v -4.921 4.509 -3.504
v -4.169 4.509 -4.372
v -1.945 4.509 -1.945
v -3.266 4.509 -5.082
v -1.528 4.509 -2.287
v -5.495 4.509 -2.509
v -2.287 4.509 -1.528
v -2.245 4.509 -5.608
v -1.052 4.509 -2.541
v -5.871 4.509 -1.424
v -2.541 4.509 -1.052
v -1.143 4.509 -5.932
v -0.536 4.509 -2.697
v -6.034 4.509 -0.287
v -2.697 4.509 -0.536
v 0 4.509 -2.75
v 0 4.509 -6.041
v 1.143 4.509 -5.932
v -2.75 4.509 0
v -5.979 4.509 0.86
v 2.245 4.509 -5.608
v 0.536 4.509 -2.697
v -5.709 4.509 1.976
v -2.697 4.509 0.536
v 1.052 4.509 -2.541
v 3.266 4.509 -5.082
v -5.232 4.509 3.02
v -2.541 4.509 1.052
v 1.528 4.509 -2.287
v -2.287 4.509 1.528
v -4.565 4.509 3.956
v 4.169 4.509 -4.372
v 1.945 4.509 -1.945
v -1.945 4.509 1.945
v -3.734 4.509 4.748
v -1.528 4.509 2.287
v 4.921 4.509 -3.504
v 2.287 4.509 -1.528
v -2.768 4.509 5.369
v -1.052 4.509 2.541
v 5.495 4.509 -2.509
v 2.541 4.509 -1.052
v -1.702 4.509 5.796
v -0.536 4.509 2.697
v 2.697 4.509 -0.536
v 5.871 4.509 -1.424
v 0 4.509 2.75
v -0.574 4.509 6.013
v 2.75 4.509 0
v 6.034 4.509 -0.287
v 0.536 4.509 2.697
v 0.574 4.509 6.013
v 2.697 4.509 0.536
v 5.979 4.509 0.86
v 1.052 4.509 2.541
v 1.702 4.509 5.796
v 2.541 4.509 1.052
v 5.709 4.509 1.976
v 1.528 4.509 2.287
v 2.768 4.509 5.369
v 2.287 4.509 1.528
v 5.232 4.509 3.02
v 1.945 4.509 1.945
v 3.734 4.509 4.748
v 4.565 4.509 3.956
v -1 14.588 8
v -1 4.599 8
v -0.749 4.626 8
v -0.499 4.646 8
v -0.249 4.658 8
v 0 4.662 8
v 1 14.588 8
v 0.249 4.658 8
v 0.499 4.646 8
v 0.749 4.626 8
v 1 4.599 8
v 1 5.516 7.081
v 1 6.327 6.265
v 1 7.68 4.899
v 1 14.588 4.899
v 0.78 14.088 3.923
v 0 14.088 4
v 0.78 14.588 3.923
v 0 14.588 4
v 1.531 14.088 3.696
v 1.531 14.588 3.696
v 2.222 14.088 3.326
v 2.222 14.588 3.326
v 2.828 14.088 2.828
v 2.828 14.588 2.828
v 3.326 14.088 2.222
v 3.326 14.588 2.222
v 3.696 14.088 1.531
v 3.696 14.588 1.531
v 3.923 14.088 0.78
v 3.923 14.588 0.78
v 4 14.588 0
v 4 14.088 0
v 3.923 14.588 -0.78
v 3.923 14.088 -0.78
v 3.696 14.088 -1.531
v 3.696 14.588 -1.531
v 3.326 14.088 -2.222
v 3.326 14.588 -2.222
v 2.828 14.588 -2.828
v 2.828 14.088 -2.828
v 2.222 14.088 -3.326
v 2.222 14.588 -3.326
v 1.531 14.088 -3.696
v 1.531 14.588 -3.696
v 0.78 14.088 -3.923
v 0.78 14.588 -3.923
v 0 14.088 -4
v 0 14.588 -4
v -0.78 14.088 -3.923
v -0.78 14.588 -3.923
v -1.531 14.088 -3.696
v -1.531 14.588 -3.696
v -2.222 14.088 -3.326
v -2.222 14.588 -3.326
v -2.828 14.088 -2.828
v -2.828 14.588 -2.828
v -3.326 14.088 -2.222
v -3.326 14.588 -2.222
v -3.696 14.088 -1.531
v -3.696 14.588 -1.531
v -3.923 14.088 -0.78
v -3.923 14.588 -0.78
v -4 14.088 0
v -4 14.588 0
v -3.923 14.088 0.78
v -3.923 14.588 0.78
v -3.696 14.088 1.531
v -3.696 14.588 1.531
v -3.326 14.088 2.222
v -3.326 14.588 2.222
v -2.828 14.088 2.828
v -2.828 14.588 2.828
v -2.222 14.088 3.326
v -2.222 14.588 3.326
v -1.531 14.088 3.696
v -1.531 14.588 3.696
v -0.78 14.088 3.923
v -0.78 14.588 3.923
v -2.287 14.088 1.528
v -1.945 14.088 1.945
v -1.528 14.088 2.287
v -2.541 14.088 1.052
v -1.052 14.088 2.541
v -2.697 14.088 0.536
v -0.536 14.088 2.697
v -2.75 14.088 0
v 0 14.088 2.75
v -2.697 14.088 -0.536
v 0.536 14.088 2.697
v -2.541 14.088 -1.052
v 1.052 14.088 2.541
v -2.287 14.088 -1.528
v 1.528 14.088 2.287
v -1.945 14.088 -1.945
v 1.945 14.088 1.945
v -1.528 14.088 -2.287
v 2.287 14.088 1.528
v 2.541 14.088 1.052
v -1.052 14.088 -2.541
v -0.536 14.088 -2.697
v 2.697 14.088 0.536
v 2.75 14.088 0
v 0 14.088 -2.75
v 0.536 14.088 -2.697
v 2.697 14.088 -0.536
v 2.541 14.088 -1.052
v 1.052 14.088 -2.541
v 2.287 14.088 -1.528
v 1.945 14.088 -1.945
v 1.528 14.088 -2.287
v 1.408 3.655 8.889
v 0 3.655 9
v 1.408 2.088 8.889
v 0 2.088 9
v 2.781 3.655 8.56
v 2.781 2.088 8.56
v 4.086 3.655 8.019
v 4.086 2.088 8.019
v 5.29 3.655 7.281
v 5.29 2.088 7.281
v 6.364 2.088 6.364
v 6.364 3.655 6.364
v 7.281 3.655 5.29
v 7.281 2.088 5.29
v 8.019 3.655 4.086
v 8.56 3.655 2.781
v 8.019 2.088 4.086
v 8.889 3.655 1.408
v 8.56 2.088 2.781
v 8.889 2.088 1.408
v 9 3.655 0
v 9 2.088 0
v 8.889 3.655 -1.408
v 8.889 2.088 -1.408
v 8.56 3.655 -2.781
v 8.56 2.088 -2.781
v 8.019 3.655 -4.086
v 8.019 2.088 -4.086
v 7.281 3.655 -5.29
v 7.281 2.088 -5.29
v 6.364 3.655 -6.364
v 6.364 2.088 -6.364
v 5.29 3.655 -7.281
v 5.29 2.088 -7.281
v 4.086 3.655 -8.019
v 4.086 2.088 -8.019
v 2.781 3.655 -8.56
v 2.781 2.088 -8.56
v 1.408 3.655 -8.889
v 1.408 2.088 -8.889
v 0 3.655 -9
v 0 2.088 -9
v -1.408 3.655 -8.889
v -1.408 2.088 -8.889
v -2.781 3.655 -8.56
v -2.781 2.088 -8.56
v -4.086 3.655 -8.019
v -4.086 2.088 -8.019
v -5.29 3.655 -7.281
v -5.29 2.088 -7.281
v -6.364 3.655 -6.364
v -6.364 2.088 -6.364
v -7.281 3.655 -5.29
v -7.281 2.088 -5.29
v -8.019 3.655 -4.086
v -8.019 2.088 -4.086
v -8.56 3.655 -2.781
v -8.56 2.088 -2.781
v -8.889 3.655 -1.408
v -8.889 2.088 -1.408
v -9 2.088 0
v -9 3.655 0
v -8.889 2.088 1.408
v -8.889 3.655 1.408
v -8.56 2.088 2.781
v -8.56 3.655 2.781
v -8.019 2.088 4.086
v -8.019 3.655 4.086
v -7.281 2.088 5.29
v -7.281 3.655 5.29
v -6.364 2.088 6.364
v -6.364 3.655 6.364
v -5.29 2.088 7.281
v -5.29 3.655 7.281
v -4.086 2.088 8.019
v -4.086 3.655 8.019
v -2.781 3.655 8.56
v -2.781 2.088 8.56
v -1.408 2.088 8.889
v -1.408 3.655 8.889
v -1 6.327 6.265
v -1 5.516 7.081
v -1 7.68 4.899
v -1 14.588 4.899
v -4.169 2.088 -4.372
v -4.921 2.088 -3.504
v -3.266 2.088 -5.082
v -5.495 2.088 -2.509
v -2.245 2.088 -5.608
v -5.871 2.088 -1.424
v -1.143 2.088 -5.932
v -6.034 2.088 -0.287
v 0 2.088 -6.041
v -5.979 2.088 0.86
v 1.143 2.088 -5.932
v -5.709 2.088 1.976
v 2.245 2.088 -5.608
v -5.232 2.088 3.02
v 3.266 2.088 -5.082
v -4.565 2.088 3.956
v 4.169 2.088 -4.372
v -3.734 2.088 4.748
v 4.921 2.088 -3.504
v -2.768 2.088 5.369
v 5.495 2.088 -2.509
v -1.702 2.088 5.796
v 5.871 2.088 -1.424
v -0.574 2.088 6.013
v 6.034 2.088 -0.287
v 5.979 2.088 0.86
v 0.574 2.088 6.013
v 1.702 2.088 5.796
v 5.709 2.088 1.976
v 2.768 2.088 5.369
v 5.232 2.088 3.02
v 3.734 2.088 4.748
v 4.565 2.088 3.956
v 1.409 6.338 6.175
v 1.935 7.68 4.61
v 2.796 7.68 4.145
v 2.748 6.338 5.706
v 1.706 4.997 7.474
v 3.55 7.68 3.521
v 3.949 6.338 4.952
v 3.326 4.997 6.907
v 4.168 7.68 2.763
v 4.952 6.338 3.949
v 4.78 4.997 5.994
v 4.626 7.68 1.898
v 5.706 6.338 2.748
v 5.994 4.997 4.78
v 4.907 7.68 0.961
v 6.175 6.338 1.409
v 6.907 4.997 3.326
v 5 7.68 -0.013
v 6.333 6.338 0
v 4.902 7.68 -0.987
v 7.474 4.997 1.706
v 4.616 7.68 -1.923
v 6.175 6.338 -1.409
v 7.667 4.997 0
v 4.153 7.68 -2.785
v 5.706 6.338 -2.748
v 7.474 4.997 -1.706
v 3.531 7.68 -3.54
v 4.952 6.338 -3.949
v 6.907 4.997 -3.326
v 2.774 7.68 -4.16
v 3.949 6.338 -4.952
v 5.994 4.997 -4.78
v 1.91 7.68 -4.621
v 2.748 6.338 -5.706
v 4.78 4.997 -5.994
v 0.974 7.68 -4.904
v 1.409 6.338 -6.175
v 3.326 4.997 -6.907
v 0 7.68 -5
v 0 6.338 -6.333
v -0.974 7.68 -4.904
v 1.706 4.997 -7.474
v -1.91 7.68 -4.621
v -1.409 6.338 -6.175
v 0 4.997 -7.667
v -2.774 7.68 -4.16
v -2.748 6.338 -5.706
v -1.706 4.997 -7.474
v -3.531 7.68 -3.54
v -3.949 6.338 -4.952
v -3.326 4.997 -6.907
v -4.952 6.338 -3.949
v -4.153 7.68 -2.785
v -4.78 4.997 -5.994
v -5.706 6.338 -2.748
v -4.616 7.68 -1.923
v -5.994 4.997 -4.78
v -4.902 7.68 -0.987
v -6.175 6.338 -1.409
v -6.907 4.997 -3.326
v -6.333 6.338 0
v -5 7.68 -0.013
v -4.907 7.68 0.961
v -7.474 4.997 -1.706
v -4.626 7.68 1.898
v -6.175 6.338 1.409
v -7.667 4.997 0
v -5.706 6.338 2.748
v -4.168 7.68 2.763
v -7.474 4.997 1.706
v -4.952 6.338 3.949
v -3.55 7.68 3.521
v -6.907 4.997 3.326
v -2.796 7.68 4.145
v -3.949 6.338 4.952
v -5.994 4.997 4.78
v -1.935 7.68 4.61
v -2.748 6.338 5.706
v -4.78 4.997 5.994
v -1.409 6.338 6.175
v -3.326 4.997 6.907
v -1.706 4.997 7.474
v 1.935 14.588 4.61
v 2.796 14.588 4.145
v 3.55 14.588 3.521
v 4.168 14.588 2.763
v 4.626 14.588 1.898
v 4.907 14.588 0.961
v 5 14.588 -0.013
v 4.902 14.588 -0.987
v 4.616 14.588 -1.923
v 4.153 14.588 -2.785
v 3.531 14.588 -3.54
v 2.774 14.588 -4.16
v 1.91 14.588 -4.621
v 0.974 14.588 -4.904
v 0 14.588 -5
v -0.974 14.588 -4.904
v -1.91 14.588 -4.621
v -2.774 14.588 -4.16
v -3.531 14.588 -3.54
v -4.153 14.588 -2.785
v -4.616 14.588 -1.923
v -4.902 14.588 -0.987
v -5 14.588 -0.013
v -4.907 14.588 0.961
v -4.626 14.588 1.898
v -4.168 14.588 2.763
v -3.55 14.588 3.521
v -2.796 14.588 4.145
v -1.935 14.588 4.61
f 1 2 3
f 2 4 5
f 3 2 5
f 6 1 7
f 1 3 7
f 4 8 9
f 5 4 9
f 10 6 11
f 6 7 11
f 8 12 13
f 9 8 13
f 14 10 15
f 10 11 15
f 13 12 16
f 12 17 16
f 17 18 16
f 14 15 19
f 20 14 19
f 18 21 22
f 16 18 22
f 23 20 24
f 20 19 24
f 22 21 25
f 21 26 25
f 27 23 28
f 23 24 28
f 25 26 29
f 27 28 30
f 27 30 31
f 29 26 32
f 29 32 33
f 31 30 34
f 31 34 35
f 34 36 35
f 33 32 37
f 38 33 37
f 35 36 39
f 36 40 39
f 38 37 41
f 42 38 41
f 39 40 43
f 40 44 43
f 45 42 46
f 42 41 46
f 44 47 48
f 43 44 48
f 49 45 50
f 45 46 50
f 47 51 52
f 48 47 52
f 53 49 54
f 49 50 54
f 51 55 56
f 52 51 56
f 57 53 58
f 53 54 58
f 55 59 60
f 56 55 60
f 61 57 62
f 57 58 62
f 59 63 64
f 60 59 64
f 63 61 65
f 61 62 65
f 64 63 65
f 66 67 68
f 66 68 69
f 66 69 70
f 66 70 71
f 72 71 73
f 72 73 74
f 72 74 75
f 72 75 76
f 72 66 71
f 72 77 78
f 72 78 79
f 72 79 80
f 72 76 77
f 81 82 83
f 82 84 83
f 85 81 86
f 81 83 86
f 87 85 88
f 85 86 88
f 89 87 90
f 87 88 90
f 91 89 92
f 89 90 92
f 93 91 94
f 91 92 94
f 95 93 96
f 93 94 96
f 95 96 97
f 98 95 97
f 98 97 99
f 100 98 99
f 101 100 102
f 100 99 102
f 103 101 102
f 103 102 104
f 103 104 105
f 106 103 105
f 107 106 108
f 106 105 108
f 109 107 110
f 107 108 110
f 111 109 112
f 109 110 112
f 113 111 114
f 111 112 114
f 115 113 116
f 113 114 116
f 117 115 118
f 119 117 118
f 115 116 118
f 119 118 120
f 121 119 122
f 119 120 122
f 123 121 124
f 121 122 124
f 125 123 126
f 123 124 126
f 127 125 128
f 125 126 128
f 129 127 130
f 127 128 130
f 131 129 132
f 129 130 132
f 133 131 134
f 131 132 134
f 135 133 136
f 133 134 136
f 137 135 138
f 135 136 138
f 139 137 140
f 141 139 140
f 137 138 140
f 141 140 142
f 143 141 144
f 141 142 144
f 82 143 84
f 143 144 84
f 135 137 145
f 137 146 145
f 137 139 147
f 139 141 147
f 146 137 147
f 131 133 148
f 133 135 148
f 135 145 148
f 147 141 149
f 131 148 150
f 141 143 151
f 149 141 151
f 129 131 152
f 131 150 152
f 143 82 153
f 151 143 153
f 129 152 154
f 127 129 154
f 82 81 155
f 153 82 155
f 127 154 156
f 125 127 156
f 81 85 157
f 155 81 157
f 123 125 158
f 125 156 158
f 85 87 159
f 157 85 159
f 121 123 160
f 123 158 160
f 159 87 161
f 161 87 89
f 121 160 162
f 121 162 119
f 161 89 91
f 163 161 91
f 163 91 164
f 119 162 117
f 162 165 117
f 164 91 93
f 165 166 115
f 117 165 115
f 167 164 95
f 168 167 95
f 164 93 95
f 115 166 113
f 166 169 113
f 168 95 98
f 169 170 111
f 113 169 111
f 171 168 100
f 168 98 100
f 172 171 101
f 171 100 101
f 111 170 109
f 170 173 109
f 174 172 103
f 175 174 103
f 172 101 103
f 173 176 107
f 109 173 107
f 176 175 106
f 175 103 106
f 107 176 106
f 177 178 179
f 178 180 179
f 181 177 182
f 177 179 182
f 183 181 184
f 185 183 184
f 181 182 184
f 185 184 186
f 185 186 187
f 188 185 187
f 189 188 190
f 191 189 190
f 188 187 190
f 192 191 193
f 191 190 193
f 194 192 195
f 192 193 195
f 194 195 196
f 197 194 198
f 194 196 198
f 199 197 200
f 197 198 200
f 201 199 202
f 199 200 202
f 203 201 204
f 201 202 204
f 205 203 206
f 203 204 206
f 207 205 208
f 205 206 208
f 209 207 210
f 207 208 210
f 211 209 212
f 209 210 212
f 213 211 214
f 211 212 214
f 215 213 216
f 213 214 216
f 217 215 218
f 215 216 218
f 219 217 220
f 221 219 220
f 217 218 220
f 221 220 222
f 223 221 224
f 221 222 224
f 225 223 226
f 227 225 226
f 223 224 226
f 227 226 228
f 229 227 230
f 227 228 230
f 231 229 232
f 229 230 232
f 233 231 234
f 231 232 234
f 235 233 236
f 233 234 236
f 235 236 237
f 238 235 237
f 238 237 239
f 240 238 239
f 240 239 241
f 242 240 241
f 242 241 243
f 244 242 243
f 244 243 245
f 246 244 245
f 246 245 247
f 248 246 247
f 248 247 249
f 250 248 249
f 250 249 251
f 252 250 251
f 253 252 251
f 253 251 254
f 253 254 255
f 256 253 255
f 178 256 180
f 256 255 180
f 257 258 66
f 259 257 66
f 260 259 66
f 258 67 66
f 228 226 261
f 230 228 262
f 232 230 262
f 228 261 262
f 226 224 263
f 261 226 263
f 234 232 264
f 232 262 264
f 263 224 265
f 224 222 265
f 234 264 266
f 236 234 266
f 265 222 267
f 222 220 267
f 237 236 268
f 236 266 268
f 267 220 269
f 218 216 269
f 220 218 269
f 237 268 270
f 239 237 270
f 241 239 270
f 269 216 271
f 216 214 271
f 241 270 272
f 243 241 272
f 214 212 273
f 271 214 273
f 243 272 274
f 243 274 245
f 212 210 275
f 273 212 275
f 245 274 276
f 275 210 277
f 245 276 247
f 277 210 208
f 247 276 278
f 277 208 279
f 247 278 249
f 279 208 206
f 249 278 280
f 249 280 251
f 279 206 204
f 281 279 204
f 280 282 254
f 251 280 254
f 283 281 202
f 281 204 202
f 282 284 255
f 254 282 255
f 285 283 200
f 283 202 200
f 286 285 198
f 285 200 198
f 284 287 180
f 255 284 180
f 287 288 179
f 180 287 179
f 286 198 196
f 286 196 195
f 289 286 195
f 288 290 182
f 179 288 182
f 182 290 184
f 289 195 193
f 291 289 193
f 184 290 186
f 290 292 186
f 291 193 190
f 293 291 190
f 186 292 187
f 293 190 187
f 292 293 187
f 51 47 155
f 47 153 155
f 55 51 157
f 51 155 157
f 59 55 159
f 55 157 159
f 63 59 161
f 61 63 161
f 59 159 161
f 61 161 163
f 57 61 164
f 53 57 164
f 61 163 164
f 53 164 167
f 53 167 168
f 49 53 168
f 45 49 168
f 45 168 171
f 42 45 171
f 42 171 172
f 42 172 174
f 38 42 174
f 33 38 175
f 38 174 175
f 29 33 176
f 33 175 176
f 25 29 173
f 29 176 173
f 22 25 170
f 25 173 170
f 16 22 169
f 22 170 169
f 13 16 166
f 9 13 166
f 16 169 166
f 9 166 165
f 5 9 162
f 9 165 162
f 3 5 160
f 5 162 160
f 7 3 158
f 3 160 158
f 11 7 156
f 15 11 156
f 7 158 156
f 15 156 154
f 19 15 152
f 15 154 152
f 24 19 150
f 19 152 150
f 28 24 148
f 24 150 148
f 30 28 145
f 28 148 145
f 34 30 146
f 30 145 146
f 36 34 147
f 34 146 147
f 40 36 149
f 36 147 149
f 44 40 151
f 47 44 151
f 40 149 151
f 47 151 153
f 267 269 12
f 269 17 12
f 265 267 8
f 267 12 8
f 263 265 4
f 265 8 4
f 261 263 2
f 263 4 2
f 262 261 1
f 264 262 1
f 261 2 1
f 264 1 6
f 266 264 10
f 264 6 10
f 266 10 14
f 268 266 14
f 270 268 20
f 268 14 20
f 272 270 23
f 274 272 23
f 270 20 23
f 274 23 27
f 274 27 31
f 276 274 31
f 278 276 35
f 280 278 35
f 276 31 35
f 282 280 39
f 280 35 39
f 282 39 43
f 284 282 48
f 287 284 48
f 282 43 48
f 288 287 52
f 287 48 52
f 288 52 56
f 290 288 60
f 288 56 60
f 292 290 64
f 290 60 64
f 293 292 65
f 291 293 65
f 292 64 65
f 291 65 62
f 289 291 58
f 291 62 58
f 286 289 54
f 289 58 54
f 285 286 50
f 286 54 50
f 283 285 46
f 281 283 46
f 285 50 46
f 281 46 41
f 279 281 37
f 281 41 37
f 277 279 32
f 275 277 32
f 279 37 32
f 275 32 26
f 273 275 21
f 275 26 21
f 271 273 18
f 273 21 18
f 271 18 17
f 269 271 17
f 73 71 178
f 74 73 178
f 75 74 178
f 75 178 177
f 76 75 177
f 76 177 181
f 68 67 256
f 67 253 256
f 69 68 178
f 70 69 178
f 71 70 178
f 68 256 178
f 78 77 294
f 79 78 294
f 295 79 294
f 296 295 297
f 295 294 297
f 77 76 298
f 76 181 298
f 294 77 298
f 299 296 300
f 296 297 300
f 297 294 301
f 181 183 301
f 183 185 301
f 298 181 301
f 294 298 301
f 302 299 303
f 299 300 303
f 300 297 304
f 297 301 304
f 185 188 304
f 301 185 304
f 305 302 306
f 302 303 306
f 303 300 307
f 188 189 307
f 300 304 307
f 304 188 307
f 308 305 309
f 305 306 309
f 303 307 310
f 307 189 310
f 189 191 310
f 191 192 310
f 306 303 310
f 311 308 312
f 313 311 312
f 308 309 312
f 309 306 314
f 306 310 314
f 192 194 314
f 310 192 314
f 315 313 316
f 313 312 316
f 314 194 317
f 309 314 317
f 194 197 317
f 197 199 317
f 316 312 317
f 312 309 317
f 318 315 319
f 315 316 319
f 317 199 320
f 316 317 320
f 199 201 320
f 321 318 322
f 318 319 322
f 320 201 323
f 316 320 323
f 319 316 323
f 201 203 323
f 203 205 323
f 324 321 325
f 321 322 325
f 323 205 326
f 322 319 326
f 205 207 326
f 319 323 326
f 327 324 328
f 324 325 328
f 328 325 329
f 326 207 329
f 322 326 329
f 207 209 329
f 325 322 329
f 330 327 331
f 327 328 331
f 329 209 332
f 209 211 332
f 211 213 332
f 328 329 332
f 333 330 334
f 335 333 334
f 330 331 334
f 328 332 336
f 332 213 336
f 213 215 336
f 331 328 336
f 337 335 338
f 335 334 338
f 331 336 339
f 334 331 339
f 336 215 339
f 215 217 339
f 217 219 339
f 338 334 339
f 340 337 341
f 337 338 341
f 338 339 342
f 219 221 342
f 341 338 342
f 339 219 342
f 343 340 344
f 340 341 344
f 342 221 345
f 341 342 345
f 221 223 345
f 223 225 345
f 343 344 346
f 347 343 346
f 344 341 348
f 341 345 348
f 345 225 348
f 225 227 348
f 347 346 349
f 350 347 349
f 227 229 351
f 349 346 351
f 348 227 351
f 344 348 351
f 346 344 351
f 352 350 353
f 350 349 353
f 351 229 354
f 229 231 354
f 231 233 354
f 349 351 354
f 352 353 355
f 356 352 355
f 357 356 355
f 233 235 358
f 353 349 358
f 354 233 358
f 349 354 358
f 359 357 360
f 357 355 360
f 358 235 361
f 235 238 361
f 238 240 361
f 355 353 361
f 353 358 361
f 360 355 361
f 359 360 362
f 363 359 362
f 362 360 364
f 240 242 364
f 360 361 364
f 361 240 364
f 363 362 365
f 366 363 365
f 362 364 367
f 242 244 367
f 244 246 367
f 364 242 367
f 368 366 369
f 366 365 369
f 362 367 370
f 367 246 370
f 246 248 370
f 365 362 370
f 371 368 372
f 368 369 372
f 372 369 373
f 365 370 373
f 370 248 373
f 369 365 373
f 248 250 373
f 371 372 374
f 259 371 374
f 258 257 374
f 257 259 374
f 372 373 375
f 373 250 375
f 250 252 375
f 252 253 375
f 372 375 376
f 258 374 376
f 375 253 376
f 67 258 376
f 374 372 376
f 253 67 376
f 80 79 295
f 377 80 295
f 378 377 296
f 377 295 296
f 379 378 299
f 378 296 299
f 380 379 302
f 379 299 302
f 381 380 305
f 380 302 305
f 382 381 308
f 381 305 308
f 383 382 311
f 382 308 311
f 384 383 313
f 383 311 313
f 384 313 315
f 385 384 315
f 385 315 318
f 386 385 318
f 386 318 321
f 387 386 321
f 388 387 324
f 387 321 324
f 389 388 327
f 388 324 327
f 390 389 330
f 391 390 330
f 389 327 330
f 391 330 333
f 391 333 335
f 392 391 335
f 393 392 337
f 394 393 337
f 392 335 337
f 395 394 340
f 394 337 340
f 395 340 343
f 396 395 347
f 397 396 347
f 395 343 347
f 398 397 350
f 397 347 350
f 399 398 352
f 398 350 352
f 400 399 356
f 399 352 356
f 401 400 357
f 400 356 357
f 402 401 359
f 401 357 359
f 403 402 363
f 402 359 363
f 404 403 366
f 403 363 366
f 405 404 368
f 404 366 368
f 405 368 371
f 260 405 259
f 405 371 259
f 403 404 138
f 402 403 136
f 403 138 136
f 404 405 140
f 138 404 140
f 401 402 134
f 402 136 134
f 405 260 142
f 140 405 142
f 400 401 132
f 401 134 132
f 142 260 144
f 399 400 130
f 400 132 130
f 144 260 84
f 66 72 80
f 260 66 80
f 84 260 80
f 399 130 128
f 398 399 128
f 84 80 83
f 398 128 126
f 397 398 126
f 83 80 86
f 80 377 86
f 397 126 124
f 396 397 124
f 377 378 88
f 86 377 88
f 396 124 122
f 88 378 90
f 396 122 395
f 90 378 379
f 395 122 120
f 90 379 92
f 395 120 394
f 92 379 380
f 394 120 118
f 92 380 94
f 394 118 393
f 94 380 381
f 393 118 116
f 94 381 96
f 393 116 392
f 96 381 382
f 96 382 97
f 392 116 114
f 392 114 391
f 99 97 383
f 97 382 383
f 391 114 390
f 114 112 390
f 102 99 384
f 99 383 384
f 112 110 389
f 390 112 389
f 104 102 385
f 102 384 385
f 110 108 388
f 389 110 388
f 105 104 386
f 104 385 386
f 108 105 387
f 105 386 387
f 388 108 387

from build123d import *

# Parameters (mm, degrees)
SKETCH2_W           = 2
SKETCH2_H           = 12.5
BOSS_EXTRUDE1_DEPTH = 3.5
SKETCH3_W           = 6.040817985
SKETCH3_H           = 3.31390433


with BuildPart() as part:
    # Sketch1 → Revolve1 (revolve)
    with BuildSketch(Plane(origin=(0, 0, 0), x_dir=(0, 0, -1), z_dir=(1, 0, 0))):
        Polygon((-4, 14.088414634), (-4, 14.588414634), (-5, 14.588414634), (-5, 7.679878049), (-9, 3.655487805), (-9, 2.088414634), (-6, 2.088414634), (-6, 4.509146341), (-2.75, 4.509146341), (-2.75, 14.088414634), align=None)
    revolve(axis=Axis((0, 0, 0), (0, 1, 0)))

    # Sketch2 → Boss-Extrude1 (add)
    with BuildSketch(Plane.XY.offset(8)):
        with Locations((0, 8.338414634)):
            Rectangle(SKETCH2_W, SKETCH2_H)
    extrude(amount=-BOSS_EXTRUDE1_DEPTH)

    # Sketch3 → Cut-Revolve1 (revolve, cut)
    with BuildSketch(Plane(origin=(0, 0, 0), x_dir=(0, 0, -1), z_dir=(1, 0, 0))):
        with Locations((3.020408993, 2.852194176)):
            Rectangle(SKETCH3_W, SKETCH3_H)
    revolve(axis=Axis((0, 1.195242011, 0), (0, 1, 0)), mode=Mode.SUBTRACT)


solid = part.part
